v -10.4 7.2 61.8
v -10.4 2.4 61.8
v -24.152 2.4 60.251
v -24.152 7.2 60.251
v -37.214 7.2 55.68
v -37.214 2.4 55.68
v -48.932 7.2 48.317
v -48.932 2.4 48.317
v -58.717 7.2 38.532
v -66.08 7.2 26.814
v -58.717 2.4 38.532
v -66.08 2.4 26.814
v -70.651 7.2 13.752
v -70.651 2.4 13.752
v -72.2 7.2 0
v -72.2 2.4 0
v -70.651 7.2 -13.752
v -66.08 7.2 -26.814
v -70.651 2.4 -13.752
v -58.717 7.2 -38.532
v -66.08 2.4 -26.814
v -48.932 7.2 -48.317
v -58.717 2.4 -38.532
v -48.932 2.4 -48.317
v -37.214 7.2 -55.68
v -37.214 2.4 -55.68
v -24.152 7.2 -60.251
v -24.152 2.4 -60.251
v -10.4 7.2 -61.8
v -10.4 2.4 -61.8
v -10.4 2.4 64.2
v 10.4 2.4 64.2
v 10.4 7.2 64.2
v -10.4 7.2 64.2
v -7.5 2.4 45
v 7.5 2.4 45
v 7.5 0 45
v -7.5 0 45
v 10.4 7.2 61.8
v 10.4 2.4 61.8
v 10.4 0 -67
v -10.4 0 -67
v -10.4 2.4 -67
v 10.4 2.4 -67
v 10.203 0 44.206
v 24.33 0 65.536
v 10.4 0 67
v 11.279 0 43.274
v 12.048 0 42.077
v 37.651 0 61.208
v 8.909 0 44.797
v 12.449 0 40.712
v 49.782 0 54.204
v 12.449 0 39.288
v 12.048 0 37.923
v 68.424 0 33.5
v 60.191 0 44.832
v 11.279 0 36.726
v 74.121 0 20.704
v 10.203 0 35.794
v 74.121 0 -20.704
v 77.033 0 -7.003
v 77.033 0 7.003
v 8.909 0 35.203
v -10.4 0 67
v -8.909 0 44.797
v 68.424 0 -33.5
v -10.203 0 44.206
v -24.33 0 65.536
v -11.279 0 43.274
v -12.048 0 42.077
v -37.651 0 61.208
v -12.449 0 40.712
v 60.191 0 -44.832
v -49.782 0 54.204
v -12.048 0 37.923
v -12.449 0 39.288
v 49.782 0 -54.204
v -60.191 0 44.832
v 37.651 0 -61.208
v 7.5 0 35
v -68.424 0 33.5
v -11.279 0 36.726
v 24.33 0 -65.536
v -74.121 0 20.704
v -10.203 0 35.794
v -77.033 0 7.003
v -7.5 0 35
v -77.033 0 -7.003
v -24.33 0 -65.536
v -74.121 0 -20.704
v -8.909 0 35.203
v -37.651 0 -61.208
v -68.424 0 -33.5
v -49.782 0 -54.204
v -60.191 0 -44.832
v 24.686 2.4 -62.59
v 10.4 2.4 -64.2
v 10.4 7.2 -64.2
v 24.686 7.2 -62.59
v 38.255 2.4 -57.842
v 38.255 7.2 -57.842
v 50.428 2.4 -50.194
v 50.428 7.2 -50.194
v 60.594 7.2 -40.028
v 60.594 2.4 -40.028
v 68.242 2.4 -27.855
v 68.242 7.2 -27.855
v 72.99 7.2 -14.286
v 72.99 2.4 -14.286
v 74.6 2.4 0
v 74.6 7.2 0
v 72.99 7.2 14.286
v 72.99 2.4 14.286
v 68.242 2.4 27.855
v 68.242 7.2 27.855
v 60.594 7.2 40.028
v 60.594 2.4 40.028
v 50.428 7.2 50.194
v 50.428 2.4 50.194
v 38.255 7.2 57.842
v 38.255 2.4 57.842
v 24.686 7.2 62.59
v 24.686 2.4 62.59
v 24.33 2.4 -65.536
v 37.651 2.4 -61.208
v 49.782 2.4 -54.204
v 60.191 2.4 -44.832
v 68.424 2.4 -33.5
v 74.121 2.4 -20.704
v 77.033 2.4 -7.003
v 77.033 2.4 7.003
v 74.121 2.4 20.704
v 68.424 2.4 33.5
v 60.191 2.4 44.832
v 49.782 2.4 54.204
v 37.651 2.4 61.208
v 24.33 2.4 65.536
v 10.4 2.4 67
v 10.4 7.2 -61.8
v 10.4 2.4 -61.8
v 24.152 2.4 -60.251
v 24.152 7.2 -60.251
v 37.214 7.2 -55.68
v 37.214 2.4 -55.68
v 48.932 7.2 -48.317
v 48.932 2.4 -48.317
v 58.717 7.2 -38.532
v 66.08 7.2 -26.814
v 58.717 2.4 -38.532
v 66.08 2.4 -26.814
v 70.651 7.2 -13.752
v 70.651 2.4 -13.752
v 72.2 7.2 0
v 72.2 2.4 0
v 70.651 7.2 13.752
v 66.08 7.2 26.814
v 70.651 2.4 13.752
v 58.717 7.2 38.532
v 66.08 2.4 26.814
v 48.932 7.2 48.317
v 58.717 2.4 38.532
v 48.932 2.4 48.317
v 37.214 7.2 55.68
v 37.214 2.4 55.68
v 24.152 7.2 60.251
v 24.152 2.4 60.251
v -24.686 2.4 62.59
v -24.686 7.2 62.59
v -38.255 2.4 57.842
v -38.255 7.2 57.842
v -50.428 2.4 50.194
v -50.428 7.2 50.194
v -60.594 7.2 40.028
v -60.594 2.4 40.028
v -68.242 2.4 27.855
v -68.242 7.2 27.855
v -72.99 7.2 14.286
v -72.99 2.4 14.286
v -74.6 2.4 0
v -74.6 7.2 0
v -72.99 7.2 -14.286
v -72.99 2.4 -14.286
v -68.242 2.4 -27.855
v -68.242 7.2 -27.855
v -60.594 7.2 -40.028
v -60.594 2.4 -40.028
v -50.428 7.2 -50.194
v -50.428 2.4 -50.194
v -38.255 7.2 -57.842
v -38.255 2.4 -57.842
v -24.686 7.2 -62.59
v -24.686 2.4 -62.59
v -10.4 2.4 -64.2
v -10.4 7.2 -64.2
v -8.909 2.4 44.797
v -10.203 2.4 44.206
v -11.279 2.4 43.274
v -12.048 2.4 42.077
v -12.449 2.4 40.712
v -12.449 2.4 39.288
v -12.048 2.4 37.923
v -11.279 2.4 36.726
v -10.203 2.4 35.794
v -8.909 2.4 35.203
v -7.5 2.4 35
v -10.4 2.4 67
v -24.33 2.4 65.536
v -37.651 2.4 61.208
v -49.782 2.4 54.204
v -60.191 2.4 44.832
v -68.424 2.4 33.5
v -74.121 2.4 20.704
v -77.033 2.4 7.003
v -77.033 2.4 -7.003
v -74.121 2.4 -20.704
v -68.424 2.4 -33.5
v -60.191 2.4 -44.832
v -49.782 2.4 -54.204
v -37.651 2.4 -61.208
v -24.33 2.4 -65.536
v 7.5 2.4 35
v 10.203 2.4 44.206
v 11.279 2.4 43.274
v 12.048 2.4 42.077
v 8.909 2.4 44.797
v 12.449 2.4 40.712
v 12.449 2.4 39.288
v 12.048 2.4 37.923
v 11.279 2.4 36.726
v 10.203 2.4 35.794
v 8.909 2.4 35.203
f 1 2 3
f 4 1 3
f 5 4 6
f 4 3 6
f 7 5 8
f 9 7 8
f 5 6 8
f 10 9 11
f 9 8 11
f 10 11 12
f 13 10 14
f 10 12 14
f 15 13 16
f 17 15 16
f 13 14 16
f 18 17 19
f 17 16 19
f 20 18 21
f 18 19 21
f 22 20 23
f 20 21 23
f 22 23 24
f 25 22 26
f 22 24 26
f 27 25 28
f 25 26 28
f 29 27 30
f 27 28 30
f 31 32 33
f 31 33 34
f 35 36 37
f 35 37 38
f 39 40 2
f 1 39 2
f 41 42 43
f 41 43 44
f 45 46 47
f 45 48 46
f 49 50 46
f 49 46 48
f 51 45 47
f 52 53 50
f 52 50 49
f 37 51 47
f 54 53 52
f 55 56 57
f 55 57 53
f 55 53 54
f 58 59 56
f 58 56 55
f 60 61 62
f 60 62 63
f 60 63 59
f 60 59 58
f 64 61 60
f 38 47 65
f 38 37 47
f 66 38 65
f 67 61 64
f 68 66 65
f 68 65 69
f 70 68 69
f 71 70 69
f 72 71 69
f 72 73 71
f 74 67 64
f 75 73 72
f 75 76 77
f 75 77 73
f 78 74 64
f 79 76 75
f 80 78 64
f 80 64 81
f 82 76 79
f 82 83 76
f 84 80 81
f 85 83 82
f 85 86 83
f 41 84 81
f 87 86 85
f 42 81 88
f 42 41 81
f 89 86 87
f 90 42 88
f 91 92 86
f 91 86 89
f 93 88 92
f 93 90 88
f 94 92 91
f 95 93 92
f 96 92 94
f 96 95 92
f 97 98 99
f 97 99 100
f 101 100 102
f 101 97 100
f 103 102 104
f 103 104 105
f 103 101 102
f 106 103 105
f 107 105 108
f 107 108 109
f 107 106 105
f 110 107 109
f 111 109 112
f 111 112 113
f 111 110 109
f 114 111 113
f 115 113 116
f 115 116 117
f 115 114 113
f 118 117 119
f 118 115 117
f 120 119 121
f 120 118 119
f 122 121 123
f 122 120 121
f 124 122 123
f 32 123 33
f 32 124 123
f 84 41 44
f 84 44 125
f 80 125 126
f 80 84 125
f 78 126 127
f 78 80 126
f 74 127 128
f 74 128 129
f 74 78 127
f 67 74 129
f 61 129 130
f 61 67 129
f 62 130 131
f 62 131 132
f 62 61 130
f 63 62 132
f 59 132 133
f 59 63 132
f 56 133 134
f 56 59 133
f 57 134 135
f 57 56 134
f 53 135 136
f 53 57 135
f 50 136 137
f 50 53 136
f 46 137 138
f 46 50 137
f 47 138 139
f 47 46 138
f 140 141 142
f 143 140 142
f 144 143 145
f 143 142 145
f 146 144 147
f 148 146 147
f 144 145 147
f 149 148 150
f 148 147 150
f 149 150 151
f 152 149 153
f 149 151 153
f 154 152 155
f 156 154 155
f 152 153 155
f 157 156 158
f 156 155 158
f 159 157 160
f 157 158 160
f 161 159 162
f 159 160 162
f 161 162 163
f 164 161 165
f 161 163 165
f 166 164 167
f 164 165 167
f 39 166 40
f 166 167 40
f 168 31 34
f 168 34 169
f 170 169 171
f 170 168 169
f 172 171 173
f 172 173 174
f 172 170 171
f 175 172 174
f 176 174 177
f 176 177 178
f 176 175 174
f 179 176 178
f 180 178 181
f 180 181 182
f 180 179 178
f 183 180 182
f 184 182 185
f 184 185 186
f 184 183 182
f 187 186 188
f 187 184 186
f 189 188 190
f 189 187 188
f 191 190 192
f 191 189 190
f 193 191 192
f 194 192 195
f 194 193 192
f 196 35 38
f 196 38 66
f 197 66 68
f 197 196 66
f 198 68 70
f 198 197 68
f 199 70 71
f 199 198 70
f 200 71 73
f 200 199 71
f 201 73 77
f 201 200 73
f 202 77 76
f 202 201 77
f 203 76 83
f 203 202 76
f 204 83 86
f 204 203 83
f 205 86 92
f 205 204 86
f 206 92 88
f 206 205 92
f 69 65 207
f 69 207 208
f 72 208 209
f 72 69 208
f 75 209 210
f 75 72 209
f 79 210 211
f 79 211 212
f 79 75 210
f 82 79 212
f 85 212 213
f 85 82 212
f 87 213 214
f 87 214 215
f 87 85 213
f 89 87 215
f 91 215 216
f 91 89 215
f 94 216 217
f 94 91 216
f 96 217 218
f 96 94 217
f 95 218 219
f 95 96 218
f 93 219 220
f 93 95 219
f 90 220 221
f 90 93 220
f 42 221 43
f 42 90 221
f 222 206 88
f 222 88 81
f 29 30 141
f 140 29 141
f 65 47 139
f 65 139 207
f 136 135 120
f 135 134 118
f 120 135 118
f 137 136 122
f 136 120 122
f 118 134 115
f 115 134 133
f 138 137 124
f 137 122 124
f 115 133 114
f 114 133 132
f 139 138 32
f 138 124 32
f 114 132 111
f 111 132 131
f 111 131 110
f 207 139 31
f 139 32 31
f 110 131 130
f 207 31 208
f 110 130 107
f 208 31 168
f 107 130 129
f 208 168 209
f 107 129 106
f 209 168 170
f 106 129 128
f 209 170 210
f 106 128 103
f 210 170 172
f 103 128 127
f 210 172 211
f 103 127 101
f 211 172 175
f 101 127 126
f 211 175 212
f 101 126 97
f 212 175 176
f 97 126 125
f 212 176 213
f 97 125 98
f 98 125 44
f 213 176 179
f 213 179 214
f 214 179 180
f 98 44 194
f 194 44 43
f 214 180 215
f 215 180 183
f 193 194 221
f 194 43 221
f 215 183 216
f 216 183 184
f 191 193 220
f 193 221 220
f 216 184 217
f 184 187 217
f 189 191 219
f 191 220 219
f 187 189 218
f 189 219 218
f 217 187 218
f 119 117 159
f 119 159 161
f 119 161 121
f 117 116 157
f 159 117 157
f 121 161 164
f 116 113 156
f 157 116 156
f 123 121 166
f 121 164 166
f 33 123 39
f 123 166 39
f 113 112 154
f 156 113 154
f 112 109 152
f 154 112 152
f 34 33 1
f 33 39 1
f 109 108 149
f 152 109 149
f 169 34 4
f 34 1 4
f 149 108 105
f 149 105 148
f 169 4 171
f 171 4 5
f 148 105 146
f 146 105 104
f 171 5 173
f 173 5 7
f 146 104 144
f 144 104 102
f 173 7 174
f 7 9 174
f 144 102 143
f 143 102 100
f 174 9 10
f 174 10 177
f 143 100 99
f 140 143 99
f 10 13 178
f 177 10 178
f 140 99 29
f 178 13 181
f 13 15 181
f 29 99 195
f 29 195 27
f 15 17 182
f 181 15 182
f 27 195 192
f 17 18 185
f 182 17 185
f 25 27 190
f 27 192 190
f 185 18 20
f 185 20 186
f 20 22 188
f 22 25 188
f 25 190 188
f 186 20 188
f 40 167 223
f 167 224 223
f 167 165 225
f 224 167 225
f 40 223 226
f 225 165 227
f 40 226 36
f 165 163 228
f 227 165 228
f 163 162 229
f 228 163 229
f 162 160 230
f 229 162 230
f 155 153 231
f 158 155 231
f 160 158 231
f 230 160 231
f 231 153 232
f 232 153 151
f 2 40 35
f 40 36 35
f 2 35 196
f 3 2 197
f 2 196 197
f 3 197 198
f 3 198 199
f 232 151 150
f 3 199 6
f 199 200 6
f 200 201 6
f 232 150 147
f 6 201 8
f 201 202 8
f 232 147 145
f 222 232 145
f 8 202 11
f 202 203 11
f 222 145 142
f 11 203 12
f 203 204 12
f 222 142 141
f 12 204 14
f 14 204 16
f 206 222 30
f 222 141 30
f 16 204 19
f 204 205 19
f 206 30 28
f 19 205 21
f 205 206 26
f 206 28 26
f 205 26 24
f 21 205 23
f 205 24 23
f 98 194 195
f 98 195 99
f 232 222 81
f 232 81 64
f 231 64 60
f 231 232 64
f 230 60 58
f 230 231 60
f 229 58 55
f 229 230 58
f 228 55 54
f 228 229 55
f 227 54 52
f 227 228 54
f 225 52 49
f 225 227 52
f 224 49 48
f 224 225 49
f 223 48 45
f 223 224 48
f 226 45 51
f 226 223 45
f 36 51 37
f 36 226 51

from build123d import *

# Parameters (mm, degrees)
BOSS_EXTRUDE1_DEPTH = 2.4
BOSS_EXTRUDE2_DEPTH = 4.8
CUT_EXTRUDE1_DEPTH  = 103.48316935


with BuildPart() as part:
    # Sketch1 → Boss-Extrude1 (new body)
    with BuildSketch(Plane(origin=(0, 0, 0), x_dir=(1, 0, 0), z_dir=(0, 1, 0))):
        with BuildLine():
            Line((-10.4, 67), (10.4, 67))
            ThreePointArc((10.4, 67), (77.4, 0), (10.4, -67))
            Line((10.4, -67), (-10.4, -67))
            ThreePointArc((-10.4, -67), (-77.4, 0), (-10.4, 67))
        make_face()
    extrude(amount=BOSS_EXTRUDE1_DEPTH)

    # Sketch2 → Boss-Extrude2 (add)
    with BuildSketch(Plane(origin=(0, 2.4, 0), x_dir=(1, 0, 0), z_dir=(0, 1, 0))):
        with BuildLine():
            Line((-10.4, 64.2), (10.4, 64.2))
            ThreePointArc((10.4, 64.2), (74.6, 0), (10.4, -64.2))
            Line((10.4, -64.2), (-10.4, -64.2))
            ThreePointArc((-10.4, -64.2), (-74.6, 0), (-10.4, 64.2))
        make_face()
        with BuildLine():
            Line((-10.4, 61.8), (10.4, 61.8))
            ThreePointArc((10.4, 61.8), (72.2, 0), (10.4, -61.8))
            Line((10.4, -61.8), (-10.4, -61.8))
            ThreePointArc((-10.4, -61.8), (-72.2, 0), (-10.4, 61.8))
        make_face(mode=Mode.SUBTRACT)
    extrude(amount=BOSS_EXTRUDE2_DEPTH)

    # Sketch3 → Cut-Extrude1 (cut, through all)
    with BuildSketch(Plane(origin=(0, 2.4, 0), x_dir=(1, 0, 0), z_dir=(0, 1, 0))):
        with BuildLine():
            Line((-7.5, -35), (7.5, -35))
            ThreePointArc((7.5, -35), (12.5, -40), (7.5, -45))
            Line((7.5, -45), (-7.5, -45))
            ThreePointArc((-7.5, -45), (-12.5, -40), (-7.5, -35))
        make_face()
    extrude(amount=-CUT_EXTRUDE1_DEPTH, mode=Mode.SUBTRACT)


solid = part.part
